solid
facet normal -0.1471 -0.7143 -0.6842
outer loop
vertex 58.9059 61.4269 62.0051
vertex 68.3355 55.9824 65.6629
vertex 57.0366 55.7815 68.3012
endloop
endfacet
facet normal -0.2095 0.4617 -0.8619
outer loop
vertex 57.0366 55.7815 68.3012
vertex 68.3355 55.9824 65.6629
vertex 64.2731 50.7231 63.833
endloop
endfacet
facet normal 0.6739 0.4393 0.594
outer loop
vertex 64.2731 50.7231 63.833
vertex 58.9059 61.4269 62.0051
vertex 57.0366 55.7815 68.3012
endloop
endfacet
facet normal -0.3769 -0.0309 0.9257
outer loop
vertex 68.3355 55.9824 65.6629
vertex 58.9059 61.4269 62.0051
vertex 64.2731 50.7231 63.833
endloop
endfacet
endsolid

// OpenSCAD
// Auto-generated auxetic polyhedron
points = [
    [57.036552, 55.781515, 68.301245],
    [68.335519, 55.982360, 65.662896],
    [58.905936, 61.426869, 62.005120],
    [64.273117, 50.723094, 63.833023],
];

faces = [
    [0, 1, 2],
    [3, 1, 0],
    [0, 2, 3],
    [3, 2, 1],
];

polyhedron(points = points, faces = faces);
